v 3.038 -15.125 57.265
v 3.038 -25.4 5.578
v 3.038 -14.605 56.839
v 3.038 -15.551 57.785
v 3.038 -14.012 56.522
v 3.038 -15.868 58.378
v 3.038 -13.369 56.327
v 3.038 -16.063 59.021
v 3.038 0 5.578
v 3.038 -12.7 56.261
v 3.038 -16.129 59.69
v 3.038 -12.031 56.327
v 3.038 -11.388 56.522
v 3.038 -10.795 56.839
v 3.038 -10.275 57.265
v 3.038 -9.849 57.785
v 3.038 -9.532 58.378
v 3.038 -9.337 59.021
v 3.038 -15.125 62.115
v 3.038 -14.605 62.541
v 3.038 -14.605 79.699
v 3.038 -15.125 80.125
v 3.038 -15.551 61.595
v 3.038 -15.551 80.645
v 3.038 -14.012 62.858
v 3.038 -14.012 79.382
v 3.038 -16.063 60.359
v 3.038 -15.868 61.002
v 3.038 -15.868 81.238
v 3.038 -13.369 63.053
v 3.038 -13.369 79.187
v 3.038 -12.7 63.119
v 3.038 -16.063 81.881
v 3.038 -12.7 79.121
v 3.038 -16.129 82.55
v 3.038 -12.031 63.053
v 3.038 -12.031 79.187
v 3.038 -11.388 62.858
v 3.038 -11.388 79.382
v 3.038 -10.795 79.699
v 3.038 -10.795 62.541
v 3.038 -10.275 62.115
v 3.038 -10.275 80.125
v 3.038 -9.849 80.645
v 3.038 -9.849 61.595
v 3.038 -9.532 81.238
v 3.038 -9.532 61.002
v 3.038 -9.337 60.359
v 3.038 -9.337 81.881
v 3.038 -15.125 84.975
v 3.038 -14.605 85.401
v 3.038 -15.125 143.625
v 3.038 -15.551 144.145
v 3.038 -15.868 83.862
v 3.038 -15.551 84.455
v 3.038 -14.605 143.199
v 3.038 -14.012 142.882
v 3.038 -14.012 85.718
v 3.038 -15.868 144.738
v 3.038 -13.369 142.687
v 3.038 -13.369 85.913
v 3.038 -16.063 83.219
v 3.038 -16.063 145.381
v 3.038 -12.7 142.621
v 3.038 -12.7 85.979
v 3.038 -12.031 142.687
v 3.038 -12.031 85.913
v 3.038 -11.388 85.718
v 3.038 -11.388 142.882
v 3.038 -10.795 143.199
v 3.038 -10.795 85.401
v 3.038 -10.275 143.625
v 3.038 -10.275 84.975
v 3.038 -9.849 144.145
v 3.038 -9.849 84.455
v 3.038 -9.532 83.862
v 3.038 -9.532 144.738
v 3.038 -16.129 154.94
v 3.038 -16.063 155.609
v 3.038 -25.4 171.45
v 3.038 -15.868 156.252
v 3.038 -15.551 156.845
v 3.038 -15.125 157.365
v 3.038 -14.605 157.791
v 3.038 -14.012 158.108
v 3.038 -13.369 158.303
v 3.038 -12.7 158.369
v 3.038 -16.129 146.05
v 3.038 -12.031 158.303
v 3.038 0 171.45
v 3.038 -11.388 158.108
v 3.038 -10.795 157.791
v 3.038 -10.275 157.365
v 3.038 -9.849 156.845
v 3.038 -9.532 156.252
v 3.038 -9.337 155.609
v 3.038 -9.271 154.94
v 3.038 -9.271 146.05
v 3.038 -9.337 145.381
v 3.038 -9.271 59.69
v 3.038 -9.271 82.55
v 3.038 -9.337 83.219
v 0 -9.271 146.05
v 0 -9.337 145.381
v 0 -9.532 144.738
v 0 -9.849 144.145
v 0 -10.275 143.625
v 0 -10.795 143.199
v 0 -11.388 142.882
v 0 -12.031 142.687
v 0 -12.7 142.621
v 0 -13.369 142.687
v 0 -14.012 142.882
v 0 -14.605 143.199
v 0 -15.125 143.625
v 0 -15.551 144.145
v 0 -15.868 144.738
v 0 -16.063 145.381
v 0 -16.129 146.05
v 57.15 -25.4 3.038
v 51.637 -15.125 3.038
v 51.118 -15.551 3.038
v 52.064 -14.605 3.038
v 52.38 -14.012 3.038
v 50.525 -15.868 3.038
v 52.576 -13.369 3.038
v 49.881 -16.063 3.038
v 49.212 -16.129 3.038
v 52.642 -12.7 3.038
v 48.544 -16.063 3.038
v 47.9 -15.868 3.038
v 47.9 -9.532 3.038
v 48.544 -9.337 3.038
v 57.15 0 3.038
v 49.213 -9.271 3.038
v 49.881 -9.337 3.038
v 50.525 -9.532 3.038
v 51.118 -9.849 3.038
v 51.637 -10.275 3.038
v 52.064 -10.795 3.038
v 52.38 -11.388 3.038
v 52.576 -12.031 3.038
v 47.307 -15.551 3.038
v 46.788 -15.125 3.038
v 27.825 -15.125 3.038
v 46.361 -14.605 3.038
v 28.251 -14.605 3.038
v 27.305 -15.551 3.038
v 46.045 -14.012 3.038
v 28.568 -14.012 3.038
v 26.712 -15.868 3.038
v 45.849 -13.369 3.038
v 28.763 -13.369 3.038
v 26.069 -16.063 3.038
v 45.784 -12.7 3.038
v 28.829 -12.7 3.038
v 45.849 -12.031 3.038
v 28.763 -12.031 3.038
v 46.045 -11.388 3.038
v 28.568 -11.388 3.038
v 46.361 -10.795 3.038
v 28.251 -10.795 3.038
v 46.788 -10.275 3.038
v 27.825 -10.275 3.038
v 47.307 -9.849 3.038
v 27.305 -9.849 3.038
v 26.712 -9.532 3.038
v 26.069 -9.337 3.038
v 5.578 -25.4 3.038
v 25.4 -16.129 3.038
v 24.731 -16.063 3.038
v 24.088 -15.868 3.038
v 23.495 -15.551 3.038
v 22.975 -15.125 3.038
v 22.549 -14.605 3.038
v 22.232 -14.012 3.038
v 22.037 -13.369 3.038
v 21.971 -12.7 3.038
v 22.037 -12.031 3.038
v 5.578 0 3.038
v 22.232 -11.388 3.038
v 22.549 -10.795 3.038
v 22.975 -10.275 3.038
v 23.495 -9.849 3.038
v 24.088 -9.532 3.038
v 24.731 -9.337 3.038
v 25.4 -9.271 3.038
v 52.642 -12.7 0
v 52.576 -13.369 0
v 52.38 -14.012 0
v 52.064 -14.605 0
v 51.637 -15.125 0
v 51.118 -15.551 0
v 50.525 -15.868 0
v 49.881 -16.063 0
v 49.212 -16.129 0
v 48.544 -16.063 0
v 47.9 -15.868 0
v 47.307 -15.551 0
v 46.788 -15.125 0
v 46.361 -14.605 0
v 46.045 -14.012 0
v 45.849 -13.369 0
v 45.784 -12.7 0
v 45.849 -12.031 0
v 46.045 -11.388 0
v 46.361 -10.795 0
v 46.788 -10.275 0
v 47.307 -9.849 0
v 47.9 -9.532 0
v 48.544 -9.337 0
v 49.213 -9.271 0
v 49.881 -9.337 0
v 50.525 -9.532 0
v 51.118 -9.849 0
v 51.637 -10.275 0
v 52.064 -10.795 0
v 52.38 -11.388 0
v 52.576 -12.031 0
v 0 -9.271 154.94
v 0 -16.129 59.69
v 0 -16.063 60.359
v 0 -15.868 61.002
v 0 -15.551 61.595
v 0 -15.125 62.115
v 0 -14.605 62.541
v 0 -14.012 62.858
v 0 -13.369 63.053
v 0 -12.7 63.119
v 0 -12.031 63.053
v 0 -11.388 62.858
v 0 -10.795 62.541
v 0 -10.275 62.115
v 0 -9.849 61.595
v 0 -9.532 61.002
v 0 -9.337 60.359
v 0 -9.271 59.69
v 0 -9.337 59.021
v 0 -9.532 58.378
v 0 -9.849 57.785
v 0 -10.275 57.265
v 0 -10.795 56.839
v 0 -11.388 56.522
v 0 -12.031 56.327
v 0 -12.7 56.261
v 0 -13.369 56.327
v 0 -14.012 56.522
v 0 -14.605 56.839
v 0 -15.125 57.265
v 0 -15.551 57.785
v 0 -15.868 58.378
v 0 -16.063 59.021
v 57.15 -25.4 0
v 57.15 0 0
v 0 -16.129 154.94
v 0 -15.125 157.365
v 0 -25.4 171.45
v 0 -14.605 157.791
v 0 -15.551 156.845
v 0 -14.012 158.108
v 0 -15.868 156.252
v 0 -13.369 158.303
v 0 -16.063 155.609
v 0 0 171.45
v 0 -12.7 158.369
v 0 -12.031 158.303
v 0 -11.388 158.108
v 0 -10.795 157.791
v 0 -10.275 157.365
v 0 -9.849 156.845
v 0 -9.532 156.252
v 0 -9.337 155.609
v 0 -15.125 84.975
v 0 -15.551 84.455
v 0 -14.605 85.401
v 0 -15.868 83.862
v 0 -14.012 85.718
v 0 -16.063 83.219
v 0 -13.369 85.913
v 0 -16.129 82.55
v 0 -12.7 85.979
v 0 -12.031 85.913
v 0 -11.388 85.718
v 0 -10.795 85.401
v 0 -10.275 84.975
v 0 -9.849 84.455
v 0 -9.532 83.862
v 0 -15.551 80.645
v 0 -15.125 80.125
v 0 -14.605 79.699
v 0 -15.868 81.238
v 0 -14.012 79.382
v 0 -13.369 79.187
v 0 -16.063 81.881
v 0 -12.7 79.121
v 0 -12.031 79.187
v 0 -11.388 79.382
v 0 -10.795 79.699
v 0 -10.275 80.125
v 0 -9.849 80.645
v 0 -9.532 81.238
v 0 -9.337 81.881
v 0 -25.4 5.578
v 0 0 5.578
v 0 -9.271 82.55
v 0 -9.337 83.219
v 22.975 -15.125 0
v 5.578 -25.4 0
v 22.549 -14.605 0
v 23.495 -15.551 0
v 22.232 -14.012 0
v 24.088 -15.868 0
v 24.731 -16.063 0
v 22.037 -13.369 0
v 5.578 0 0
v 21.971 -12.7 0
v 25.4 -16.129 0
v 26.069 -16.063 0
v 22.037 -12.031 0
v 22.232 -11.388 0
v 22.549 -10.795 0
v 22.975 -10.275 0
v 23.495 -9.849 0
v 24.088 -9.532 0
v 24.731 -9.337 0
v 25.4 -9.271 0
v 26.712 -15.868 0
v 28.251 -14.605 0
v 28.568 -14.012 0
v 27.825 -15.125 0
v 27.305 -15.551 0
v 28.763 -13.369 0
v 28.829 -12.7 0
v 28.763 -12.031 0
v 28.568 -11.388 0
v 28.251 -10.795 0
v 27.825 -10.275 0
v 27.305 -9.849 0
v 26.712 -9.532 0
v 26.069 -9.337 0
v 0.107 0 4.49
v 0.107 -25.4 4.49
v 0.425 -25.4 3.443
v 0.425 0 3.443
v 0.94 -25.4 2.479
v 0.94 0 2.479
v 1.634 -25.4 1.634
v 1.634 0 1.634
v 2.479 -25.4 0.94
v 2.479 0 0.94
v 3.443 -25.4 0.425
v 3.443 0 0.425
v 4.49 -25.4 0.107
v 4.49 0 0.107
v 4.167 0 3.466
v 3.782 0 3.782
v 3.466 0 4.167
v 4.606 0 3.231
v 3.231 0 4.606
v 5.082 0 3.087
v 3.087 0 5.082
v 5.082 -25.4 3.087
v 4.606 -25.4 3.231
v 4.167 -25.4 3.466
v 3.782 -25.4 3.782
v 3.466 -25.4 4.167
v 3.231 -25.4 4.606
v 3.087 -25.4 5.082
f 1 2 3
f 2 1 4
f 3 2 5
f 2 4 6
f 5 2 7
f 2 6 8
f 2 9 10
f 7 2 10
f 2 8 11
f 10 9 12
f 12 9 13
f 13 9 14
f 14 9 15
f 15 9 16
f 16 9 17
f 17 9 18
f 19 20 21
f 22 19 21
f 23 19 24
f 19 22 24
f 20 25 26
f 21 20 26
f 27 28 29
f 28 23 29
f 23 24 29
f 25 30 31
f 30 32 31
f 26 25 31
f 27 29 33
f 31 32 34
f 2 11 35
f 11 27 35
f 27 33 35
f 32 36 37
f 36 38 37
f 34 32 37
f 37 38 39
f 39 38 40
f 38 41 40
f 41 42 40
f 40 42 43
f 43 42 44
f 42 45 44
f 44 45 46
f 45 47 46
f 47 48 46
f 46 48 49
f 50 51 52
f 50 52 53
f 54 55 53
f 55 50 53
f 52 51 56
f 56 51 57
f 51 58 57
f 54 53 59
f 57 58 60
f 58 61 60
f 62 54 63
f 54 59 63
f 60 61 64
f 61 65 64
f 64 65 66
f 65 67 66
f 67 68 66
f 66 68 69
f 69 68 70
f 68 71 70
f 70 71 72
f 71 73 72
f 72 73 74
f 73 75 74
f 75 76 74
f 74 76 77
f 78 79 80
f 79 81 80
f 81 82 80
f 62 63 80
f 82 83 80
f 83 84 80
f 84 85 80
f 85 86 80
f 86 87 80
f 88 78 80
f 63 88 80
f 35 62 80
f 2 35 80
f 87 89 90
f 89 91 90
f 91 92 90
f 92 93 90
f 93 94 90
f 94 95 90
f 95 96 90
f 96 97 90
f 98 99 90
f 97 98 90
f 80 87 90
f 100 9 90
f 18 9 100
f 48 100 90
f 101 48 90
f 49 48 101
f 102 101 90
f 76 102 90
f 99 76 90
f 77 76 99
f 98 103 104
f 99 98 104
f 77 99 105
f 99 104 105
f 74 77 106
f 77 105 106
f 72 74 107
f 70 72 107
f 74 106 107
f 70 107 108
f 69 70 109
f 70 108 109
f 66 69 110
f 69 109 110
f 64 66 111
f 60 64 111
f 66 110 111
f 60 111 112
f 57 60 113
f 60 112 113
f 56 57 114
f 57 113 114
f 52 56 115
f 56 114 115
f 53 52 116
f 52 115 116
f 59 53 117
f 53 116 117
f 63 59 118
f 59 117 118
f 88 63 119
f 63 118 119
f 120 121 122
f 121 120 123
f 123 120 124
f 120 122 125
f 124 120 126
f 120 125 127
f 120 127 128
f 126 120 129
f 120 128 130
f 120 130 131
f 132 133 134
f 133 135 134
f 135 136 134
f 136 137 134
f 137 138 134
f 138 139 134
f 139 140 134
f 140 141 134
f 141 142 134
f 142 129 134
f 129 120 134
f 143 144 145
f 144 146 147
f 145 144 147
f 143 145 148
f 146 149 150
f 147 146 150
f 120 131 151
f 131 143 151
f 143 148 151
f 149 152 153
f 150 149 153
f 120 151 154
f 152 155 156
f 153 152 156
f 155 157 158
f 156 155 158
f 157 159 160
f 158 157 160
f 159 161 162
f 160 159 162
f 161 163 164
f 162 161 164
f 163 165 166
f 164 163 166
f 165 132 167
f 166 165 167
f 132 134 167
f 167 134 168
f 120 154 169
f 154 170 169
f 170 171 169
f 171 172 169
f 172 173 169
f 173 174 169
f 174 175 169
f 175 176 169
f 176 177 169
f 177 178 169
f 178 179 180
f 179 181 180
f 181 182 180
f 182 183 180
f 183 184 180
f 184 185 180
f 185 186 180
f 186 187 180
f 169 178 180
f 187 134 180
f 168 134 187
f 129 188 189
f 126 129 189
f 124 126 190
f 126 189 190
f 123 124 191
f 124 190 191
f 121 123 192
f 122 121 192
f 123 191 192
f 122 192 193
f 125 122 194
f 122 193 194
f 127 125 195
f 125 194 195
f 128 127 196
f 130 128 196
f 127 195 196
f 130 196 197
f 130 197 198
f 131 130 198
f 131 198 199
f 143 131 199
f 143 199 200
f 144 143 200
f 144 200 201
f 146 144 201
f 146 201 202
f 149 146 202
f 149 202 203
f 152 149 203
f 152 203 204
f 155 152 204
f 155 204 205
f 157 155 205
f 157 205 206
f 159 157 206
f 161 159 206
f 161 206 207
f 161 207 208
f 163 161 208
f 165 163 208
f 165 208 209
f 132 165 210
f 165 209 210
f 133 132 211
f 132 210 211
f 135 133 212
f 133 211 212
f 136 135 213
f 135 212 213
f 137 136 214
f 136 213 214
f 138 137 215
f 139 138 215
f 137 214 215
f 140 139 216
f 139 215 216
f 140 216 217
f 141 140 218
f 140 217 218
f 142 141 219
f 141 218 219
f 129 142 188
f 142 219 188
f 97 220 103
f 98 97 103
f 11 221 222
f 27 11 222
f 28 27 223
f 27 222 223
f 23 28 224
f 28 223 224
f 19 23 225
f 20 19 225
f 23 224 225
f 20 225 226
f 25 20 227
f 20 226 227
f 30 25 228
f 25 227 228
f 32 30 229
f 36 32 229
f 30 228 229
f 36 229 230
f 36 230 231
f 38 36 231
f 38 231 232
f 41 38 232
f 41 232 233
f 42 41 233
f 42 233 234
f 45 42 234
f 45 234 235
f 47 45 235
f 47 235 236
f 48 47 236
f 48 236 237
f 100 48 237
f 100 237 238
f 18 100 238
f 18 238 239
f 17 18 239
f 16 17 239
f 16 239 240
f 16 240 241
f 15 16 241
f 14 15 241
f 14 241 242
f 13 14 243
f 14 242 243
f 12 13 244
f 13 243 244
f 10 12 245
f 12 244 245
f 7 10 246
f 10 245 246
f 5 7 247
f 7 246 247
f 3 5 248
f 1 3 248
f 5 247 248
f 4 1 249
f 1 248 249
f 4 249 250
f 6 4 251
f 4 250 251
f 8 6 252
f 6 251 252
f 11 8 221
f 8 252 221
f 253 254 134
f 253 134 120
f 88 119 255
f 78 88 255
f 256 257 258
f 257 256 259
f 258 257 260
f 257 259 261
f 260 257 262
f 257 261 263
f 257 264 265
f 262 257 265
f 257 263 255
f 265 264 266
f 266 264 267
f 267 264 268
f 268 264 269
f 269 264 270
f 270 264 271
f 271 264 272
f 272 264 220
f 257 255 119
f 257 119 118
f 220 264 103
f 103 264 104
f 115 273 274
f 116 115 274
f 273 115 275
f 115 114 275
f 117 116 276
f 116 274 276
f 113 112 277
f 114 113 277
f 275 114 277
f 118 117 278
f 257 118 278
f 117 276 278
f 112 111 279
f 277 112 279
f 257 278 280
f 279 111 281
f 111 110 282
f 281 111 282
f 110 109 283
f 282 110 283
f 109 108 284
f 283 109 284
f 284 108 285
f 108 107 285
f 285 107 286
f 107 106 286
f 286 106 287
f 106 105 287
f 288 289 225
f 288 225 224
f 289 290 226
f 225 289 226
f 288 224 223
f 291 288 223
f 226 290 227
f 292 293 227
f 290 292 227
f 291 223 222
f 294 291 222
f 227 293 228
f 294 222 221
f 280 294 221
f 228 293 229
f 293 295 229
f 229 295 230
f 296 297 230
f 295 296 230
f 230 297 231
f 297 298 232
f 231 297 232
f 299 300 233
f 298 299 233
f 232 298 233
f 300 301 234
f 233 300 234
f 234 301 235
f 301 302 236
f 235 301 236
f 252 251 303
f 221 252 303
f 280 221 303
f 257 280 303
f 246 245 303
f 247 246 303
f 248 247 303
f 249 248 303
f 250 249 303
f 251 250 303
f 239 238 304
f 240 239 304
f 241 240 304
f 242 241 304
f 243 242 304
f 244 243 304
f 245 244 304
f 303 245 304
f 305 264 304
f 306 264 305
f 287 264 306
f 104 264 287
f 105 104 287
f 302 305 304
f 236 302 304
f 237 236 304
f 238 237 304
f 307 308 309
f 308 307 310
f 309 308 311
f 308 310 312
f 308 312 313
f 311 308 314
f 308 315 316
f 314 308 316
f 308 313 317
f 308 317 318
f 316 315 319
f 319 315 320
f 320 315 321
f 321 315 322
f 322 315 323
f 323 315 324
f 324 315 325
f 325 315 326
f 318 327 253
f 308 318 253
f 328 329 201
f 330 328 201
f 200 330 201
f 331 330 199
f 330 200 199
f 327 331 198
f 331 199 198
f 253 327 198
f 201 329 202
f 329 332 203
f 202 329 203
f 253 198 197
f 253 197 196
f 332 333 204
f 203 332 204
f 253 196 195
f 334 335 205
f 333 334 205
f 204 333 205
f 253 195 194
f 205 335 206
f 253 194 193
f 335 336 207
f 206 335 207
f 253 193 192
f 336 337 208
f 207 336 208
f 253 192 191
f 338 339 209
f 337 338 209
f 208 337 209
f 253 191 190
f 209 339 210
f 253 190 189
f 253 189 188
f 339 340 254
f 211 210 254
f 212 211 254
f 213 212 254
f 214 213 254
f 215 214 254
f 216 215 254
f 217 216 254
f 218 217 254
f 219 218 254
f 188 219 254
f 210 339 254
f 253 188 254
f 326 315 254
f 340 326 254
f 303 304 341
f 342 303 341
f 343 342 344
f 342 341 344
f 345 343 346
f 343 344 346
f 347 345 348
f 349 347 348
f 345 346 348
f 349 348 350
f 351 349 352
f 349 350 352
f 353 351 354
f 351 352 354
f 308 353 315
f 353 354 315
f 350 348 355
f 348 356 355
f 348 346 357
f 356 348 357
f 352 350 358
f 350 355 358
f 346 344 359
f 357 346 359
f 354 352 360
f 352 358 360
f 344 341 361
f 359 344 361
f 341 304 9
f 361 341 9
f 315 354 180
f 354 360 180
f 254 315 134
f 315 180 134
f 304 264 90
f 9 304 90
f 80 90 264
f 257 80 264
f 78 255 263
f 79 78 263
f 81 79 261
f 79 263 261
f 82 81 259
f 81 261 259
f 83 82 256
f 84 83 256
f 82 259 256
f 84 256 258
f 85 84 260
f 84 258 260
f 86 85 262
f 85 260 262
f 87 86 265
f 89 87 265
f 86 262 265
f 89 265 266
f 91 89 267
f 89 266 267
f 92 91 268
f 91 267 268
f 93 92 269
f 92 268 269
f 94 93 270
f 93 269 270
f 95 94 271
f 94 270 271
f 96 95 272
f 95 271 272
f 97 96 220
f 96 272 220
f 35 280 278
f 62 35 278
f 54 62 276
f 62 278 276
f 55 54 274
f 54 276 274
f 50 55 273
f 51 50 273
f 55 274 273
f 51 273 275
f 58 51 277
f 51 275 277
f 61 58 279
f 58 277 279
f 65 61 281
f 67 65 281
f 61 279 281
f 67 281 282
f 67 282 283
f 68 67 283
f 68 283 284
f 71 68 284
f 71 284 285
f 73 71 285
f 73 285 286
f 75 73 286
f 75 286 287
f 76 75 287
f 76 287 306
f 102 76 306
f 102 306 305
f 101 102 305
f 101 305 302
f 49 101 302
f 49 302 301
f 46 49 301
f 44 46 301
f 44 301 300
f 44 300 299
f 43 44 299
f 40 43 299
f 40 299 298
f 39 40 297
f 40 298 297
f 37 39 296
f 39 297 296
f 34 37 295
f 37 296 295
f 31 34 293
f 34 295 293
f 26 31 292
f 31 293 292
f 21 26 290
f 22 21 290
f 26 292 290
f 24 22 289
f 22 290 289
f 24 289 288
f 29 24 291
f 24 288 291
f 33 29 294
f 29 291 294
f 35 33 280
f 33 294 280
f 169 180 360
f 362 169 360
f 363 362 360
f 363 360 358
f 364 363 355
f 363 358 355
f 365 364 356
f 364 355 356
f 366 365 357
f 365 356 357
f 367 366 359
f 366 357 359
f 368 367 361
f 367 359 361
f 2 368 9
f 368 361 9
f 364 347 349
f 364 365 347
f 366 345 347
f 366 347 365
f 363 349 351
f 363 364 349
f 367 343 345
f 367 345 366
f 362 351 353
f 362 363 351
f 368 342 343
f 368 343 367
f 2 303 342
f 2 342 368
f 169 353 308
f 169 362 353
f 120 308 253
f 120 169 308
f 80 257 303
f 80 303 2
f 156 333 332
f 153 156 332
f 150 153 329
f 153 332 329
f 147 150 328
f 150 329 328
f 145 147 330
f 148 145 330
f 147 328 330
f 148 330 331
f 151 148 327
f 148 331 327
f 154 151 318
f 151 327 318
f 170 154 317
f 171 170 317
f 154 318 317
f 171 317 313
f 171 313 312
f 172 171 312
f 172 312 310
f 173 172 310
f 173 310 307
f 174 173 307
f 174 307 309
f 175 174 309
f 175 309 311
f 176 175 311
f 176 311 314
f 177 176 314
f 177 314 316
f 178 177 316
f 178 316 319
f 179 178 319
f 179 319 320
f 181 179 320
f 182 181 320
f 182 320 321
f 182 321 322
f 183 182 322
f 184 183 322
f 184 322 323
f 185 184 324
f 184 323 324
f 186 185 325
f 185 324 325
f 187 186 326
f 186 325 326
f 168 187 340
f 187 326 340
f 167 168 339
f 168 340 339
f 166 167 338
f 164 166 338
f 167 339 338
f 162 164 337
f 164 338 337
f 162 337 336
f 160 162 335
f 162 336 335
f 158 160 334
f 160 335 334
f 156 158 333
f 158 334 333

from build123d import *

# Parameters (mm, degrees)
F1_DEPTH = 25.4
F2_R     = 3.429
F3_DEPTH = 82.551
F4_R     = 3.429
F5_DEPTH = 171.451
F6_W     = 25.4
F6_H     = 25.4
F6_R     = 3.429
F7_DEPTH = 171.451
F8_R     = 3.429
F9_DEPTH = 171.451


with BuildPart() as f1:
    # F0 (on Front) → F1 (new body)
    with BuildSketch(Plane.XZ):
        with BuildLine():
            Line((3.03784, 171.45), (0, 171.45))
            Line((0, 171.45), (0, 5.57784))
            ThreePointArc((0, 5.57784), (1.633712, 1.633712), (5.57784, 0))
            Line((5.57784, 0), (82.55, 0))
            Line((82.55, 0), (82.55, 3.03784))
            Line((82.55, 3.03784), (5.57784, 3.03784))
            ThreePointArc((5.57784, 3.03784), (3.781789, 3.781789), (3.03784, 5.57784))
            Line((3.03784, 5.57784), (3.03784, 171.45))
        make_face()
    extrude(amount=F1_DEPTH)

    # F2 (on face) → F3 (cut, through all)
    with BuildSketch(Plane(origin=(0, 0, 0), x_dir=(0, -1, 0), z_dir=(-1, 0, 0))):
        with BuildLine():
            ThreePointArc((16.129, 154.94), (12.7, 158.369), (9.271, 154.94))
            Line((9.271, 154.94), (9.271, 146.05))
            ThreePointArc((9.271, 146.05), (12.7, 142.621), (16.129, 146.05))
            Line((16.129, 146.05), (16.129, 154.94))
        make_face()
        with Locations((12.7, 82.55)):
            Circle(F2_R)
        with Locations((12.7, 59.69)):
            Circle(F2_R)
    extrude(amount=-F3_DEPTH, mode=Mode.SUBTRACT)

    # F4 (on face) → F5 (cut, through all)
    with BuildSketch(Plane(origin=(0, 0, 0), x_dir=(1, 0, 0), z_dir=(0, 0, -1))):
        with Locations((25.4, 12.7)):
            Circle(F4_R)
        with Locations((69.85, 12.7)):
            Circle(F4_R)
    extrude(amount=-F5_DEPTH, mode=Mode.SUBTRACT)

    # F6 (on face) → F7 (cut, through all)
    with BuildSketch(Plane(origin=(0, 0, 0), x_dir=(1, 0, 0), z_dir=(0, 0, -1))):
        with Locations((69.85, 12.7)):
            Rectangle(F6_W, F6_H)
        with Locations((69.85, 12.7)):
            Circle(F6_R, mode=Mode.SUBTRACT)
    extrude(amount=-F7_DEPTH, mode=Mode.SUBTRACT)

    # F8 (on face) → F9 (cut, through all)
    with BuildSketch(Plane(origin=(0, 0, 0), x_dir=(1, 0, 0), z_dir=(0, 0, -1))):
        with Locations((49.2125, 12.7)):
            Circle(F8_R)
    extrude(amount=-F9_DEPTH, mode=Mode.SUBTRACT)


solid = f1.part
